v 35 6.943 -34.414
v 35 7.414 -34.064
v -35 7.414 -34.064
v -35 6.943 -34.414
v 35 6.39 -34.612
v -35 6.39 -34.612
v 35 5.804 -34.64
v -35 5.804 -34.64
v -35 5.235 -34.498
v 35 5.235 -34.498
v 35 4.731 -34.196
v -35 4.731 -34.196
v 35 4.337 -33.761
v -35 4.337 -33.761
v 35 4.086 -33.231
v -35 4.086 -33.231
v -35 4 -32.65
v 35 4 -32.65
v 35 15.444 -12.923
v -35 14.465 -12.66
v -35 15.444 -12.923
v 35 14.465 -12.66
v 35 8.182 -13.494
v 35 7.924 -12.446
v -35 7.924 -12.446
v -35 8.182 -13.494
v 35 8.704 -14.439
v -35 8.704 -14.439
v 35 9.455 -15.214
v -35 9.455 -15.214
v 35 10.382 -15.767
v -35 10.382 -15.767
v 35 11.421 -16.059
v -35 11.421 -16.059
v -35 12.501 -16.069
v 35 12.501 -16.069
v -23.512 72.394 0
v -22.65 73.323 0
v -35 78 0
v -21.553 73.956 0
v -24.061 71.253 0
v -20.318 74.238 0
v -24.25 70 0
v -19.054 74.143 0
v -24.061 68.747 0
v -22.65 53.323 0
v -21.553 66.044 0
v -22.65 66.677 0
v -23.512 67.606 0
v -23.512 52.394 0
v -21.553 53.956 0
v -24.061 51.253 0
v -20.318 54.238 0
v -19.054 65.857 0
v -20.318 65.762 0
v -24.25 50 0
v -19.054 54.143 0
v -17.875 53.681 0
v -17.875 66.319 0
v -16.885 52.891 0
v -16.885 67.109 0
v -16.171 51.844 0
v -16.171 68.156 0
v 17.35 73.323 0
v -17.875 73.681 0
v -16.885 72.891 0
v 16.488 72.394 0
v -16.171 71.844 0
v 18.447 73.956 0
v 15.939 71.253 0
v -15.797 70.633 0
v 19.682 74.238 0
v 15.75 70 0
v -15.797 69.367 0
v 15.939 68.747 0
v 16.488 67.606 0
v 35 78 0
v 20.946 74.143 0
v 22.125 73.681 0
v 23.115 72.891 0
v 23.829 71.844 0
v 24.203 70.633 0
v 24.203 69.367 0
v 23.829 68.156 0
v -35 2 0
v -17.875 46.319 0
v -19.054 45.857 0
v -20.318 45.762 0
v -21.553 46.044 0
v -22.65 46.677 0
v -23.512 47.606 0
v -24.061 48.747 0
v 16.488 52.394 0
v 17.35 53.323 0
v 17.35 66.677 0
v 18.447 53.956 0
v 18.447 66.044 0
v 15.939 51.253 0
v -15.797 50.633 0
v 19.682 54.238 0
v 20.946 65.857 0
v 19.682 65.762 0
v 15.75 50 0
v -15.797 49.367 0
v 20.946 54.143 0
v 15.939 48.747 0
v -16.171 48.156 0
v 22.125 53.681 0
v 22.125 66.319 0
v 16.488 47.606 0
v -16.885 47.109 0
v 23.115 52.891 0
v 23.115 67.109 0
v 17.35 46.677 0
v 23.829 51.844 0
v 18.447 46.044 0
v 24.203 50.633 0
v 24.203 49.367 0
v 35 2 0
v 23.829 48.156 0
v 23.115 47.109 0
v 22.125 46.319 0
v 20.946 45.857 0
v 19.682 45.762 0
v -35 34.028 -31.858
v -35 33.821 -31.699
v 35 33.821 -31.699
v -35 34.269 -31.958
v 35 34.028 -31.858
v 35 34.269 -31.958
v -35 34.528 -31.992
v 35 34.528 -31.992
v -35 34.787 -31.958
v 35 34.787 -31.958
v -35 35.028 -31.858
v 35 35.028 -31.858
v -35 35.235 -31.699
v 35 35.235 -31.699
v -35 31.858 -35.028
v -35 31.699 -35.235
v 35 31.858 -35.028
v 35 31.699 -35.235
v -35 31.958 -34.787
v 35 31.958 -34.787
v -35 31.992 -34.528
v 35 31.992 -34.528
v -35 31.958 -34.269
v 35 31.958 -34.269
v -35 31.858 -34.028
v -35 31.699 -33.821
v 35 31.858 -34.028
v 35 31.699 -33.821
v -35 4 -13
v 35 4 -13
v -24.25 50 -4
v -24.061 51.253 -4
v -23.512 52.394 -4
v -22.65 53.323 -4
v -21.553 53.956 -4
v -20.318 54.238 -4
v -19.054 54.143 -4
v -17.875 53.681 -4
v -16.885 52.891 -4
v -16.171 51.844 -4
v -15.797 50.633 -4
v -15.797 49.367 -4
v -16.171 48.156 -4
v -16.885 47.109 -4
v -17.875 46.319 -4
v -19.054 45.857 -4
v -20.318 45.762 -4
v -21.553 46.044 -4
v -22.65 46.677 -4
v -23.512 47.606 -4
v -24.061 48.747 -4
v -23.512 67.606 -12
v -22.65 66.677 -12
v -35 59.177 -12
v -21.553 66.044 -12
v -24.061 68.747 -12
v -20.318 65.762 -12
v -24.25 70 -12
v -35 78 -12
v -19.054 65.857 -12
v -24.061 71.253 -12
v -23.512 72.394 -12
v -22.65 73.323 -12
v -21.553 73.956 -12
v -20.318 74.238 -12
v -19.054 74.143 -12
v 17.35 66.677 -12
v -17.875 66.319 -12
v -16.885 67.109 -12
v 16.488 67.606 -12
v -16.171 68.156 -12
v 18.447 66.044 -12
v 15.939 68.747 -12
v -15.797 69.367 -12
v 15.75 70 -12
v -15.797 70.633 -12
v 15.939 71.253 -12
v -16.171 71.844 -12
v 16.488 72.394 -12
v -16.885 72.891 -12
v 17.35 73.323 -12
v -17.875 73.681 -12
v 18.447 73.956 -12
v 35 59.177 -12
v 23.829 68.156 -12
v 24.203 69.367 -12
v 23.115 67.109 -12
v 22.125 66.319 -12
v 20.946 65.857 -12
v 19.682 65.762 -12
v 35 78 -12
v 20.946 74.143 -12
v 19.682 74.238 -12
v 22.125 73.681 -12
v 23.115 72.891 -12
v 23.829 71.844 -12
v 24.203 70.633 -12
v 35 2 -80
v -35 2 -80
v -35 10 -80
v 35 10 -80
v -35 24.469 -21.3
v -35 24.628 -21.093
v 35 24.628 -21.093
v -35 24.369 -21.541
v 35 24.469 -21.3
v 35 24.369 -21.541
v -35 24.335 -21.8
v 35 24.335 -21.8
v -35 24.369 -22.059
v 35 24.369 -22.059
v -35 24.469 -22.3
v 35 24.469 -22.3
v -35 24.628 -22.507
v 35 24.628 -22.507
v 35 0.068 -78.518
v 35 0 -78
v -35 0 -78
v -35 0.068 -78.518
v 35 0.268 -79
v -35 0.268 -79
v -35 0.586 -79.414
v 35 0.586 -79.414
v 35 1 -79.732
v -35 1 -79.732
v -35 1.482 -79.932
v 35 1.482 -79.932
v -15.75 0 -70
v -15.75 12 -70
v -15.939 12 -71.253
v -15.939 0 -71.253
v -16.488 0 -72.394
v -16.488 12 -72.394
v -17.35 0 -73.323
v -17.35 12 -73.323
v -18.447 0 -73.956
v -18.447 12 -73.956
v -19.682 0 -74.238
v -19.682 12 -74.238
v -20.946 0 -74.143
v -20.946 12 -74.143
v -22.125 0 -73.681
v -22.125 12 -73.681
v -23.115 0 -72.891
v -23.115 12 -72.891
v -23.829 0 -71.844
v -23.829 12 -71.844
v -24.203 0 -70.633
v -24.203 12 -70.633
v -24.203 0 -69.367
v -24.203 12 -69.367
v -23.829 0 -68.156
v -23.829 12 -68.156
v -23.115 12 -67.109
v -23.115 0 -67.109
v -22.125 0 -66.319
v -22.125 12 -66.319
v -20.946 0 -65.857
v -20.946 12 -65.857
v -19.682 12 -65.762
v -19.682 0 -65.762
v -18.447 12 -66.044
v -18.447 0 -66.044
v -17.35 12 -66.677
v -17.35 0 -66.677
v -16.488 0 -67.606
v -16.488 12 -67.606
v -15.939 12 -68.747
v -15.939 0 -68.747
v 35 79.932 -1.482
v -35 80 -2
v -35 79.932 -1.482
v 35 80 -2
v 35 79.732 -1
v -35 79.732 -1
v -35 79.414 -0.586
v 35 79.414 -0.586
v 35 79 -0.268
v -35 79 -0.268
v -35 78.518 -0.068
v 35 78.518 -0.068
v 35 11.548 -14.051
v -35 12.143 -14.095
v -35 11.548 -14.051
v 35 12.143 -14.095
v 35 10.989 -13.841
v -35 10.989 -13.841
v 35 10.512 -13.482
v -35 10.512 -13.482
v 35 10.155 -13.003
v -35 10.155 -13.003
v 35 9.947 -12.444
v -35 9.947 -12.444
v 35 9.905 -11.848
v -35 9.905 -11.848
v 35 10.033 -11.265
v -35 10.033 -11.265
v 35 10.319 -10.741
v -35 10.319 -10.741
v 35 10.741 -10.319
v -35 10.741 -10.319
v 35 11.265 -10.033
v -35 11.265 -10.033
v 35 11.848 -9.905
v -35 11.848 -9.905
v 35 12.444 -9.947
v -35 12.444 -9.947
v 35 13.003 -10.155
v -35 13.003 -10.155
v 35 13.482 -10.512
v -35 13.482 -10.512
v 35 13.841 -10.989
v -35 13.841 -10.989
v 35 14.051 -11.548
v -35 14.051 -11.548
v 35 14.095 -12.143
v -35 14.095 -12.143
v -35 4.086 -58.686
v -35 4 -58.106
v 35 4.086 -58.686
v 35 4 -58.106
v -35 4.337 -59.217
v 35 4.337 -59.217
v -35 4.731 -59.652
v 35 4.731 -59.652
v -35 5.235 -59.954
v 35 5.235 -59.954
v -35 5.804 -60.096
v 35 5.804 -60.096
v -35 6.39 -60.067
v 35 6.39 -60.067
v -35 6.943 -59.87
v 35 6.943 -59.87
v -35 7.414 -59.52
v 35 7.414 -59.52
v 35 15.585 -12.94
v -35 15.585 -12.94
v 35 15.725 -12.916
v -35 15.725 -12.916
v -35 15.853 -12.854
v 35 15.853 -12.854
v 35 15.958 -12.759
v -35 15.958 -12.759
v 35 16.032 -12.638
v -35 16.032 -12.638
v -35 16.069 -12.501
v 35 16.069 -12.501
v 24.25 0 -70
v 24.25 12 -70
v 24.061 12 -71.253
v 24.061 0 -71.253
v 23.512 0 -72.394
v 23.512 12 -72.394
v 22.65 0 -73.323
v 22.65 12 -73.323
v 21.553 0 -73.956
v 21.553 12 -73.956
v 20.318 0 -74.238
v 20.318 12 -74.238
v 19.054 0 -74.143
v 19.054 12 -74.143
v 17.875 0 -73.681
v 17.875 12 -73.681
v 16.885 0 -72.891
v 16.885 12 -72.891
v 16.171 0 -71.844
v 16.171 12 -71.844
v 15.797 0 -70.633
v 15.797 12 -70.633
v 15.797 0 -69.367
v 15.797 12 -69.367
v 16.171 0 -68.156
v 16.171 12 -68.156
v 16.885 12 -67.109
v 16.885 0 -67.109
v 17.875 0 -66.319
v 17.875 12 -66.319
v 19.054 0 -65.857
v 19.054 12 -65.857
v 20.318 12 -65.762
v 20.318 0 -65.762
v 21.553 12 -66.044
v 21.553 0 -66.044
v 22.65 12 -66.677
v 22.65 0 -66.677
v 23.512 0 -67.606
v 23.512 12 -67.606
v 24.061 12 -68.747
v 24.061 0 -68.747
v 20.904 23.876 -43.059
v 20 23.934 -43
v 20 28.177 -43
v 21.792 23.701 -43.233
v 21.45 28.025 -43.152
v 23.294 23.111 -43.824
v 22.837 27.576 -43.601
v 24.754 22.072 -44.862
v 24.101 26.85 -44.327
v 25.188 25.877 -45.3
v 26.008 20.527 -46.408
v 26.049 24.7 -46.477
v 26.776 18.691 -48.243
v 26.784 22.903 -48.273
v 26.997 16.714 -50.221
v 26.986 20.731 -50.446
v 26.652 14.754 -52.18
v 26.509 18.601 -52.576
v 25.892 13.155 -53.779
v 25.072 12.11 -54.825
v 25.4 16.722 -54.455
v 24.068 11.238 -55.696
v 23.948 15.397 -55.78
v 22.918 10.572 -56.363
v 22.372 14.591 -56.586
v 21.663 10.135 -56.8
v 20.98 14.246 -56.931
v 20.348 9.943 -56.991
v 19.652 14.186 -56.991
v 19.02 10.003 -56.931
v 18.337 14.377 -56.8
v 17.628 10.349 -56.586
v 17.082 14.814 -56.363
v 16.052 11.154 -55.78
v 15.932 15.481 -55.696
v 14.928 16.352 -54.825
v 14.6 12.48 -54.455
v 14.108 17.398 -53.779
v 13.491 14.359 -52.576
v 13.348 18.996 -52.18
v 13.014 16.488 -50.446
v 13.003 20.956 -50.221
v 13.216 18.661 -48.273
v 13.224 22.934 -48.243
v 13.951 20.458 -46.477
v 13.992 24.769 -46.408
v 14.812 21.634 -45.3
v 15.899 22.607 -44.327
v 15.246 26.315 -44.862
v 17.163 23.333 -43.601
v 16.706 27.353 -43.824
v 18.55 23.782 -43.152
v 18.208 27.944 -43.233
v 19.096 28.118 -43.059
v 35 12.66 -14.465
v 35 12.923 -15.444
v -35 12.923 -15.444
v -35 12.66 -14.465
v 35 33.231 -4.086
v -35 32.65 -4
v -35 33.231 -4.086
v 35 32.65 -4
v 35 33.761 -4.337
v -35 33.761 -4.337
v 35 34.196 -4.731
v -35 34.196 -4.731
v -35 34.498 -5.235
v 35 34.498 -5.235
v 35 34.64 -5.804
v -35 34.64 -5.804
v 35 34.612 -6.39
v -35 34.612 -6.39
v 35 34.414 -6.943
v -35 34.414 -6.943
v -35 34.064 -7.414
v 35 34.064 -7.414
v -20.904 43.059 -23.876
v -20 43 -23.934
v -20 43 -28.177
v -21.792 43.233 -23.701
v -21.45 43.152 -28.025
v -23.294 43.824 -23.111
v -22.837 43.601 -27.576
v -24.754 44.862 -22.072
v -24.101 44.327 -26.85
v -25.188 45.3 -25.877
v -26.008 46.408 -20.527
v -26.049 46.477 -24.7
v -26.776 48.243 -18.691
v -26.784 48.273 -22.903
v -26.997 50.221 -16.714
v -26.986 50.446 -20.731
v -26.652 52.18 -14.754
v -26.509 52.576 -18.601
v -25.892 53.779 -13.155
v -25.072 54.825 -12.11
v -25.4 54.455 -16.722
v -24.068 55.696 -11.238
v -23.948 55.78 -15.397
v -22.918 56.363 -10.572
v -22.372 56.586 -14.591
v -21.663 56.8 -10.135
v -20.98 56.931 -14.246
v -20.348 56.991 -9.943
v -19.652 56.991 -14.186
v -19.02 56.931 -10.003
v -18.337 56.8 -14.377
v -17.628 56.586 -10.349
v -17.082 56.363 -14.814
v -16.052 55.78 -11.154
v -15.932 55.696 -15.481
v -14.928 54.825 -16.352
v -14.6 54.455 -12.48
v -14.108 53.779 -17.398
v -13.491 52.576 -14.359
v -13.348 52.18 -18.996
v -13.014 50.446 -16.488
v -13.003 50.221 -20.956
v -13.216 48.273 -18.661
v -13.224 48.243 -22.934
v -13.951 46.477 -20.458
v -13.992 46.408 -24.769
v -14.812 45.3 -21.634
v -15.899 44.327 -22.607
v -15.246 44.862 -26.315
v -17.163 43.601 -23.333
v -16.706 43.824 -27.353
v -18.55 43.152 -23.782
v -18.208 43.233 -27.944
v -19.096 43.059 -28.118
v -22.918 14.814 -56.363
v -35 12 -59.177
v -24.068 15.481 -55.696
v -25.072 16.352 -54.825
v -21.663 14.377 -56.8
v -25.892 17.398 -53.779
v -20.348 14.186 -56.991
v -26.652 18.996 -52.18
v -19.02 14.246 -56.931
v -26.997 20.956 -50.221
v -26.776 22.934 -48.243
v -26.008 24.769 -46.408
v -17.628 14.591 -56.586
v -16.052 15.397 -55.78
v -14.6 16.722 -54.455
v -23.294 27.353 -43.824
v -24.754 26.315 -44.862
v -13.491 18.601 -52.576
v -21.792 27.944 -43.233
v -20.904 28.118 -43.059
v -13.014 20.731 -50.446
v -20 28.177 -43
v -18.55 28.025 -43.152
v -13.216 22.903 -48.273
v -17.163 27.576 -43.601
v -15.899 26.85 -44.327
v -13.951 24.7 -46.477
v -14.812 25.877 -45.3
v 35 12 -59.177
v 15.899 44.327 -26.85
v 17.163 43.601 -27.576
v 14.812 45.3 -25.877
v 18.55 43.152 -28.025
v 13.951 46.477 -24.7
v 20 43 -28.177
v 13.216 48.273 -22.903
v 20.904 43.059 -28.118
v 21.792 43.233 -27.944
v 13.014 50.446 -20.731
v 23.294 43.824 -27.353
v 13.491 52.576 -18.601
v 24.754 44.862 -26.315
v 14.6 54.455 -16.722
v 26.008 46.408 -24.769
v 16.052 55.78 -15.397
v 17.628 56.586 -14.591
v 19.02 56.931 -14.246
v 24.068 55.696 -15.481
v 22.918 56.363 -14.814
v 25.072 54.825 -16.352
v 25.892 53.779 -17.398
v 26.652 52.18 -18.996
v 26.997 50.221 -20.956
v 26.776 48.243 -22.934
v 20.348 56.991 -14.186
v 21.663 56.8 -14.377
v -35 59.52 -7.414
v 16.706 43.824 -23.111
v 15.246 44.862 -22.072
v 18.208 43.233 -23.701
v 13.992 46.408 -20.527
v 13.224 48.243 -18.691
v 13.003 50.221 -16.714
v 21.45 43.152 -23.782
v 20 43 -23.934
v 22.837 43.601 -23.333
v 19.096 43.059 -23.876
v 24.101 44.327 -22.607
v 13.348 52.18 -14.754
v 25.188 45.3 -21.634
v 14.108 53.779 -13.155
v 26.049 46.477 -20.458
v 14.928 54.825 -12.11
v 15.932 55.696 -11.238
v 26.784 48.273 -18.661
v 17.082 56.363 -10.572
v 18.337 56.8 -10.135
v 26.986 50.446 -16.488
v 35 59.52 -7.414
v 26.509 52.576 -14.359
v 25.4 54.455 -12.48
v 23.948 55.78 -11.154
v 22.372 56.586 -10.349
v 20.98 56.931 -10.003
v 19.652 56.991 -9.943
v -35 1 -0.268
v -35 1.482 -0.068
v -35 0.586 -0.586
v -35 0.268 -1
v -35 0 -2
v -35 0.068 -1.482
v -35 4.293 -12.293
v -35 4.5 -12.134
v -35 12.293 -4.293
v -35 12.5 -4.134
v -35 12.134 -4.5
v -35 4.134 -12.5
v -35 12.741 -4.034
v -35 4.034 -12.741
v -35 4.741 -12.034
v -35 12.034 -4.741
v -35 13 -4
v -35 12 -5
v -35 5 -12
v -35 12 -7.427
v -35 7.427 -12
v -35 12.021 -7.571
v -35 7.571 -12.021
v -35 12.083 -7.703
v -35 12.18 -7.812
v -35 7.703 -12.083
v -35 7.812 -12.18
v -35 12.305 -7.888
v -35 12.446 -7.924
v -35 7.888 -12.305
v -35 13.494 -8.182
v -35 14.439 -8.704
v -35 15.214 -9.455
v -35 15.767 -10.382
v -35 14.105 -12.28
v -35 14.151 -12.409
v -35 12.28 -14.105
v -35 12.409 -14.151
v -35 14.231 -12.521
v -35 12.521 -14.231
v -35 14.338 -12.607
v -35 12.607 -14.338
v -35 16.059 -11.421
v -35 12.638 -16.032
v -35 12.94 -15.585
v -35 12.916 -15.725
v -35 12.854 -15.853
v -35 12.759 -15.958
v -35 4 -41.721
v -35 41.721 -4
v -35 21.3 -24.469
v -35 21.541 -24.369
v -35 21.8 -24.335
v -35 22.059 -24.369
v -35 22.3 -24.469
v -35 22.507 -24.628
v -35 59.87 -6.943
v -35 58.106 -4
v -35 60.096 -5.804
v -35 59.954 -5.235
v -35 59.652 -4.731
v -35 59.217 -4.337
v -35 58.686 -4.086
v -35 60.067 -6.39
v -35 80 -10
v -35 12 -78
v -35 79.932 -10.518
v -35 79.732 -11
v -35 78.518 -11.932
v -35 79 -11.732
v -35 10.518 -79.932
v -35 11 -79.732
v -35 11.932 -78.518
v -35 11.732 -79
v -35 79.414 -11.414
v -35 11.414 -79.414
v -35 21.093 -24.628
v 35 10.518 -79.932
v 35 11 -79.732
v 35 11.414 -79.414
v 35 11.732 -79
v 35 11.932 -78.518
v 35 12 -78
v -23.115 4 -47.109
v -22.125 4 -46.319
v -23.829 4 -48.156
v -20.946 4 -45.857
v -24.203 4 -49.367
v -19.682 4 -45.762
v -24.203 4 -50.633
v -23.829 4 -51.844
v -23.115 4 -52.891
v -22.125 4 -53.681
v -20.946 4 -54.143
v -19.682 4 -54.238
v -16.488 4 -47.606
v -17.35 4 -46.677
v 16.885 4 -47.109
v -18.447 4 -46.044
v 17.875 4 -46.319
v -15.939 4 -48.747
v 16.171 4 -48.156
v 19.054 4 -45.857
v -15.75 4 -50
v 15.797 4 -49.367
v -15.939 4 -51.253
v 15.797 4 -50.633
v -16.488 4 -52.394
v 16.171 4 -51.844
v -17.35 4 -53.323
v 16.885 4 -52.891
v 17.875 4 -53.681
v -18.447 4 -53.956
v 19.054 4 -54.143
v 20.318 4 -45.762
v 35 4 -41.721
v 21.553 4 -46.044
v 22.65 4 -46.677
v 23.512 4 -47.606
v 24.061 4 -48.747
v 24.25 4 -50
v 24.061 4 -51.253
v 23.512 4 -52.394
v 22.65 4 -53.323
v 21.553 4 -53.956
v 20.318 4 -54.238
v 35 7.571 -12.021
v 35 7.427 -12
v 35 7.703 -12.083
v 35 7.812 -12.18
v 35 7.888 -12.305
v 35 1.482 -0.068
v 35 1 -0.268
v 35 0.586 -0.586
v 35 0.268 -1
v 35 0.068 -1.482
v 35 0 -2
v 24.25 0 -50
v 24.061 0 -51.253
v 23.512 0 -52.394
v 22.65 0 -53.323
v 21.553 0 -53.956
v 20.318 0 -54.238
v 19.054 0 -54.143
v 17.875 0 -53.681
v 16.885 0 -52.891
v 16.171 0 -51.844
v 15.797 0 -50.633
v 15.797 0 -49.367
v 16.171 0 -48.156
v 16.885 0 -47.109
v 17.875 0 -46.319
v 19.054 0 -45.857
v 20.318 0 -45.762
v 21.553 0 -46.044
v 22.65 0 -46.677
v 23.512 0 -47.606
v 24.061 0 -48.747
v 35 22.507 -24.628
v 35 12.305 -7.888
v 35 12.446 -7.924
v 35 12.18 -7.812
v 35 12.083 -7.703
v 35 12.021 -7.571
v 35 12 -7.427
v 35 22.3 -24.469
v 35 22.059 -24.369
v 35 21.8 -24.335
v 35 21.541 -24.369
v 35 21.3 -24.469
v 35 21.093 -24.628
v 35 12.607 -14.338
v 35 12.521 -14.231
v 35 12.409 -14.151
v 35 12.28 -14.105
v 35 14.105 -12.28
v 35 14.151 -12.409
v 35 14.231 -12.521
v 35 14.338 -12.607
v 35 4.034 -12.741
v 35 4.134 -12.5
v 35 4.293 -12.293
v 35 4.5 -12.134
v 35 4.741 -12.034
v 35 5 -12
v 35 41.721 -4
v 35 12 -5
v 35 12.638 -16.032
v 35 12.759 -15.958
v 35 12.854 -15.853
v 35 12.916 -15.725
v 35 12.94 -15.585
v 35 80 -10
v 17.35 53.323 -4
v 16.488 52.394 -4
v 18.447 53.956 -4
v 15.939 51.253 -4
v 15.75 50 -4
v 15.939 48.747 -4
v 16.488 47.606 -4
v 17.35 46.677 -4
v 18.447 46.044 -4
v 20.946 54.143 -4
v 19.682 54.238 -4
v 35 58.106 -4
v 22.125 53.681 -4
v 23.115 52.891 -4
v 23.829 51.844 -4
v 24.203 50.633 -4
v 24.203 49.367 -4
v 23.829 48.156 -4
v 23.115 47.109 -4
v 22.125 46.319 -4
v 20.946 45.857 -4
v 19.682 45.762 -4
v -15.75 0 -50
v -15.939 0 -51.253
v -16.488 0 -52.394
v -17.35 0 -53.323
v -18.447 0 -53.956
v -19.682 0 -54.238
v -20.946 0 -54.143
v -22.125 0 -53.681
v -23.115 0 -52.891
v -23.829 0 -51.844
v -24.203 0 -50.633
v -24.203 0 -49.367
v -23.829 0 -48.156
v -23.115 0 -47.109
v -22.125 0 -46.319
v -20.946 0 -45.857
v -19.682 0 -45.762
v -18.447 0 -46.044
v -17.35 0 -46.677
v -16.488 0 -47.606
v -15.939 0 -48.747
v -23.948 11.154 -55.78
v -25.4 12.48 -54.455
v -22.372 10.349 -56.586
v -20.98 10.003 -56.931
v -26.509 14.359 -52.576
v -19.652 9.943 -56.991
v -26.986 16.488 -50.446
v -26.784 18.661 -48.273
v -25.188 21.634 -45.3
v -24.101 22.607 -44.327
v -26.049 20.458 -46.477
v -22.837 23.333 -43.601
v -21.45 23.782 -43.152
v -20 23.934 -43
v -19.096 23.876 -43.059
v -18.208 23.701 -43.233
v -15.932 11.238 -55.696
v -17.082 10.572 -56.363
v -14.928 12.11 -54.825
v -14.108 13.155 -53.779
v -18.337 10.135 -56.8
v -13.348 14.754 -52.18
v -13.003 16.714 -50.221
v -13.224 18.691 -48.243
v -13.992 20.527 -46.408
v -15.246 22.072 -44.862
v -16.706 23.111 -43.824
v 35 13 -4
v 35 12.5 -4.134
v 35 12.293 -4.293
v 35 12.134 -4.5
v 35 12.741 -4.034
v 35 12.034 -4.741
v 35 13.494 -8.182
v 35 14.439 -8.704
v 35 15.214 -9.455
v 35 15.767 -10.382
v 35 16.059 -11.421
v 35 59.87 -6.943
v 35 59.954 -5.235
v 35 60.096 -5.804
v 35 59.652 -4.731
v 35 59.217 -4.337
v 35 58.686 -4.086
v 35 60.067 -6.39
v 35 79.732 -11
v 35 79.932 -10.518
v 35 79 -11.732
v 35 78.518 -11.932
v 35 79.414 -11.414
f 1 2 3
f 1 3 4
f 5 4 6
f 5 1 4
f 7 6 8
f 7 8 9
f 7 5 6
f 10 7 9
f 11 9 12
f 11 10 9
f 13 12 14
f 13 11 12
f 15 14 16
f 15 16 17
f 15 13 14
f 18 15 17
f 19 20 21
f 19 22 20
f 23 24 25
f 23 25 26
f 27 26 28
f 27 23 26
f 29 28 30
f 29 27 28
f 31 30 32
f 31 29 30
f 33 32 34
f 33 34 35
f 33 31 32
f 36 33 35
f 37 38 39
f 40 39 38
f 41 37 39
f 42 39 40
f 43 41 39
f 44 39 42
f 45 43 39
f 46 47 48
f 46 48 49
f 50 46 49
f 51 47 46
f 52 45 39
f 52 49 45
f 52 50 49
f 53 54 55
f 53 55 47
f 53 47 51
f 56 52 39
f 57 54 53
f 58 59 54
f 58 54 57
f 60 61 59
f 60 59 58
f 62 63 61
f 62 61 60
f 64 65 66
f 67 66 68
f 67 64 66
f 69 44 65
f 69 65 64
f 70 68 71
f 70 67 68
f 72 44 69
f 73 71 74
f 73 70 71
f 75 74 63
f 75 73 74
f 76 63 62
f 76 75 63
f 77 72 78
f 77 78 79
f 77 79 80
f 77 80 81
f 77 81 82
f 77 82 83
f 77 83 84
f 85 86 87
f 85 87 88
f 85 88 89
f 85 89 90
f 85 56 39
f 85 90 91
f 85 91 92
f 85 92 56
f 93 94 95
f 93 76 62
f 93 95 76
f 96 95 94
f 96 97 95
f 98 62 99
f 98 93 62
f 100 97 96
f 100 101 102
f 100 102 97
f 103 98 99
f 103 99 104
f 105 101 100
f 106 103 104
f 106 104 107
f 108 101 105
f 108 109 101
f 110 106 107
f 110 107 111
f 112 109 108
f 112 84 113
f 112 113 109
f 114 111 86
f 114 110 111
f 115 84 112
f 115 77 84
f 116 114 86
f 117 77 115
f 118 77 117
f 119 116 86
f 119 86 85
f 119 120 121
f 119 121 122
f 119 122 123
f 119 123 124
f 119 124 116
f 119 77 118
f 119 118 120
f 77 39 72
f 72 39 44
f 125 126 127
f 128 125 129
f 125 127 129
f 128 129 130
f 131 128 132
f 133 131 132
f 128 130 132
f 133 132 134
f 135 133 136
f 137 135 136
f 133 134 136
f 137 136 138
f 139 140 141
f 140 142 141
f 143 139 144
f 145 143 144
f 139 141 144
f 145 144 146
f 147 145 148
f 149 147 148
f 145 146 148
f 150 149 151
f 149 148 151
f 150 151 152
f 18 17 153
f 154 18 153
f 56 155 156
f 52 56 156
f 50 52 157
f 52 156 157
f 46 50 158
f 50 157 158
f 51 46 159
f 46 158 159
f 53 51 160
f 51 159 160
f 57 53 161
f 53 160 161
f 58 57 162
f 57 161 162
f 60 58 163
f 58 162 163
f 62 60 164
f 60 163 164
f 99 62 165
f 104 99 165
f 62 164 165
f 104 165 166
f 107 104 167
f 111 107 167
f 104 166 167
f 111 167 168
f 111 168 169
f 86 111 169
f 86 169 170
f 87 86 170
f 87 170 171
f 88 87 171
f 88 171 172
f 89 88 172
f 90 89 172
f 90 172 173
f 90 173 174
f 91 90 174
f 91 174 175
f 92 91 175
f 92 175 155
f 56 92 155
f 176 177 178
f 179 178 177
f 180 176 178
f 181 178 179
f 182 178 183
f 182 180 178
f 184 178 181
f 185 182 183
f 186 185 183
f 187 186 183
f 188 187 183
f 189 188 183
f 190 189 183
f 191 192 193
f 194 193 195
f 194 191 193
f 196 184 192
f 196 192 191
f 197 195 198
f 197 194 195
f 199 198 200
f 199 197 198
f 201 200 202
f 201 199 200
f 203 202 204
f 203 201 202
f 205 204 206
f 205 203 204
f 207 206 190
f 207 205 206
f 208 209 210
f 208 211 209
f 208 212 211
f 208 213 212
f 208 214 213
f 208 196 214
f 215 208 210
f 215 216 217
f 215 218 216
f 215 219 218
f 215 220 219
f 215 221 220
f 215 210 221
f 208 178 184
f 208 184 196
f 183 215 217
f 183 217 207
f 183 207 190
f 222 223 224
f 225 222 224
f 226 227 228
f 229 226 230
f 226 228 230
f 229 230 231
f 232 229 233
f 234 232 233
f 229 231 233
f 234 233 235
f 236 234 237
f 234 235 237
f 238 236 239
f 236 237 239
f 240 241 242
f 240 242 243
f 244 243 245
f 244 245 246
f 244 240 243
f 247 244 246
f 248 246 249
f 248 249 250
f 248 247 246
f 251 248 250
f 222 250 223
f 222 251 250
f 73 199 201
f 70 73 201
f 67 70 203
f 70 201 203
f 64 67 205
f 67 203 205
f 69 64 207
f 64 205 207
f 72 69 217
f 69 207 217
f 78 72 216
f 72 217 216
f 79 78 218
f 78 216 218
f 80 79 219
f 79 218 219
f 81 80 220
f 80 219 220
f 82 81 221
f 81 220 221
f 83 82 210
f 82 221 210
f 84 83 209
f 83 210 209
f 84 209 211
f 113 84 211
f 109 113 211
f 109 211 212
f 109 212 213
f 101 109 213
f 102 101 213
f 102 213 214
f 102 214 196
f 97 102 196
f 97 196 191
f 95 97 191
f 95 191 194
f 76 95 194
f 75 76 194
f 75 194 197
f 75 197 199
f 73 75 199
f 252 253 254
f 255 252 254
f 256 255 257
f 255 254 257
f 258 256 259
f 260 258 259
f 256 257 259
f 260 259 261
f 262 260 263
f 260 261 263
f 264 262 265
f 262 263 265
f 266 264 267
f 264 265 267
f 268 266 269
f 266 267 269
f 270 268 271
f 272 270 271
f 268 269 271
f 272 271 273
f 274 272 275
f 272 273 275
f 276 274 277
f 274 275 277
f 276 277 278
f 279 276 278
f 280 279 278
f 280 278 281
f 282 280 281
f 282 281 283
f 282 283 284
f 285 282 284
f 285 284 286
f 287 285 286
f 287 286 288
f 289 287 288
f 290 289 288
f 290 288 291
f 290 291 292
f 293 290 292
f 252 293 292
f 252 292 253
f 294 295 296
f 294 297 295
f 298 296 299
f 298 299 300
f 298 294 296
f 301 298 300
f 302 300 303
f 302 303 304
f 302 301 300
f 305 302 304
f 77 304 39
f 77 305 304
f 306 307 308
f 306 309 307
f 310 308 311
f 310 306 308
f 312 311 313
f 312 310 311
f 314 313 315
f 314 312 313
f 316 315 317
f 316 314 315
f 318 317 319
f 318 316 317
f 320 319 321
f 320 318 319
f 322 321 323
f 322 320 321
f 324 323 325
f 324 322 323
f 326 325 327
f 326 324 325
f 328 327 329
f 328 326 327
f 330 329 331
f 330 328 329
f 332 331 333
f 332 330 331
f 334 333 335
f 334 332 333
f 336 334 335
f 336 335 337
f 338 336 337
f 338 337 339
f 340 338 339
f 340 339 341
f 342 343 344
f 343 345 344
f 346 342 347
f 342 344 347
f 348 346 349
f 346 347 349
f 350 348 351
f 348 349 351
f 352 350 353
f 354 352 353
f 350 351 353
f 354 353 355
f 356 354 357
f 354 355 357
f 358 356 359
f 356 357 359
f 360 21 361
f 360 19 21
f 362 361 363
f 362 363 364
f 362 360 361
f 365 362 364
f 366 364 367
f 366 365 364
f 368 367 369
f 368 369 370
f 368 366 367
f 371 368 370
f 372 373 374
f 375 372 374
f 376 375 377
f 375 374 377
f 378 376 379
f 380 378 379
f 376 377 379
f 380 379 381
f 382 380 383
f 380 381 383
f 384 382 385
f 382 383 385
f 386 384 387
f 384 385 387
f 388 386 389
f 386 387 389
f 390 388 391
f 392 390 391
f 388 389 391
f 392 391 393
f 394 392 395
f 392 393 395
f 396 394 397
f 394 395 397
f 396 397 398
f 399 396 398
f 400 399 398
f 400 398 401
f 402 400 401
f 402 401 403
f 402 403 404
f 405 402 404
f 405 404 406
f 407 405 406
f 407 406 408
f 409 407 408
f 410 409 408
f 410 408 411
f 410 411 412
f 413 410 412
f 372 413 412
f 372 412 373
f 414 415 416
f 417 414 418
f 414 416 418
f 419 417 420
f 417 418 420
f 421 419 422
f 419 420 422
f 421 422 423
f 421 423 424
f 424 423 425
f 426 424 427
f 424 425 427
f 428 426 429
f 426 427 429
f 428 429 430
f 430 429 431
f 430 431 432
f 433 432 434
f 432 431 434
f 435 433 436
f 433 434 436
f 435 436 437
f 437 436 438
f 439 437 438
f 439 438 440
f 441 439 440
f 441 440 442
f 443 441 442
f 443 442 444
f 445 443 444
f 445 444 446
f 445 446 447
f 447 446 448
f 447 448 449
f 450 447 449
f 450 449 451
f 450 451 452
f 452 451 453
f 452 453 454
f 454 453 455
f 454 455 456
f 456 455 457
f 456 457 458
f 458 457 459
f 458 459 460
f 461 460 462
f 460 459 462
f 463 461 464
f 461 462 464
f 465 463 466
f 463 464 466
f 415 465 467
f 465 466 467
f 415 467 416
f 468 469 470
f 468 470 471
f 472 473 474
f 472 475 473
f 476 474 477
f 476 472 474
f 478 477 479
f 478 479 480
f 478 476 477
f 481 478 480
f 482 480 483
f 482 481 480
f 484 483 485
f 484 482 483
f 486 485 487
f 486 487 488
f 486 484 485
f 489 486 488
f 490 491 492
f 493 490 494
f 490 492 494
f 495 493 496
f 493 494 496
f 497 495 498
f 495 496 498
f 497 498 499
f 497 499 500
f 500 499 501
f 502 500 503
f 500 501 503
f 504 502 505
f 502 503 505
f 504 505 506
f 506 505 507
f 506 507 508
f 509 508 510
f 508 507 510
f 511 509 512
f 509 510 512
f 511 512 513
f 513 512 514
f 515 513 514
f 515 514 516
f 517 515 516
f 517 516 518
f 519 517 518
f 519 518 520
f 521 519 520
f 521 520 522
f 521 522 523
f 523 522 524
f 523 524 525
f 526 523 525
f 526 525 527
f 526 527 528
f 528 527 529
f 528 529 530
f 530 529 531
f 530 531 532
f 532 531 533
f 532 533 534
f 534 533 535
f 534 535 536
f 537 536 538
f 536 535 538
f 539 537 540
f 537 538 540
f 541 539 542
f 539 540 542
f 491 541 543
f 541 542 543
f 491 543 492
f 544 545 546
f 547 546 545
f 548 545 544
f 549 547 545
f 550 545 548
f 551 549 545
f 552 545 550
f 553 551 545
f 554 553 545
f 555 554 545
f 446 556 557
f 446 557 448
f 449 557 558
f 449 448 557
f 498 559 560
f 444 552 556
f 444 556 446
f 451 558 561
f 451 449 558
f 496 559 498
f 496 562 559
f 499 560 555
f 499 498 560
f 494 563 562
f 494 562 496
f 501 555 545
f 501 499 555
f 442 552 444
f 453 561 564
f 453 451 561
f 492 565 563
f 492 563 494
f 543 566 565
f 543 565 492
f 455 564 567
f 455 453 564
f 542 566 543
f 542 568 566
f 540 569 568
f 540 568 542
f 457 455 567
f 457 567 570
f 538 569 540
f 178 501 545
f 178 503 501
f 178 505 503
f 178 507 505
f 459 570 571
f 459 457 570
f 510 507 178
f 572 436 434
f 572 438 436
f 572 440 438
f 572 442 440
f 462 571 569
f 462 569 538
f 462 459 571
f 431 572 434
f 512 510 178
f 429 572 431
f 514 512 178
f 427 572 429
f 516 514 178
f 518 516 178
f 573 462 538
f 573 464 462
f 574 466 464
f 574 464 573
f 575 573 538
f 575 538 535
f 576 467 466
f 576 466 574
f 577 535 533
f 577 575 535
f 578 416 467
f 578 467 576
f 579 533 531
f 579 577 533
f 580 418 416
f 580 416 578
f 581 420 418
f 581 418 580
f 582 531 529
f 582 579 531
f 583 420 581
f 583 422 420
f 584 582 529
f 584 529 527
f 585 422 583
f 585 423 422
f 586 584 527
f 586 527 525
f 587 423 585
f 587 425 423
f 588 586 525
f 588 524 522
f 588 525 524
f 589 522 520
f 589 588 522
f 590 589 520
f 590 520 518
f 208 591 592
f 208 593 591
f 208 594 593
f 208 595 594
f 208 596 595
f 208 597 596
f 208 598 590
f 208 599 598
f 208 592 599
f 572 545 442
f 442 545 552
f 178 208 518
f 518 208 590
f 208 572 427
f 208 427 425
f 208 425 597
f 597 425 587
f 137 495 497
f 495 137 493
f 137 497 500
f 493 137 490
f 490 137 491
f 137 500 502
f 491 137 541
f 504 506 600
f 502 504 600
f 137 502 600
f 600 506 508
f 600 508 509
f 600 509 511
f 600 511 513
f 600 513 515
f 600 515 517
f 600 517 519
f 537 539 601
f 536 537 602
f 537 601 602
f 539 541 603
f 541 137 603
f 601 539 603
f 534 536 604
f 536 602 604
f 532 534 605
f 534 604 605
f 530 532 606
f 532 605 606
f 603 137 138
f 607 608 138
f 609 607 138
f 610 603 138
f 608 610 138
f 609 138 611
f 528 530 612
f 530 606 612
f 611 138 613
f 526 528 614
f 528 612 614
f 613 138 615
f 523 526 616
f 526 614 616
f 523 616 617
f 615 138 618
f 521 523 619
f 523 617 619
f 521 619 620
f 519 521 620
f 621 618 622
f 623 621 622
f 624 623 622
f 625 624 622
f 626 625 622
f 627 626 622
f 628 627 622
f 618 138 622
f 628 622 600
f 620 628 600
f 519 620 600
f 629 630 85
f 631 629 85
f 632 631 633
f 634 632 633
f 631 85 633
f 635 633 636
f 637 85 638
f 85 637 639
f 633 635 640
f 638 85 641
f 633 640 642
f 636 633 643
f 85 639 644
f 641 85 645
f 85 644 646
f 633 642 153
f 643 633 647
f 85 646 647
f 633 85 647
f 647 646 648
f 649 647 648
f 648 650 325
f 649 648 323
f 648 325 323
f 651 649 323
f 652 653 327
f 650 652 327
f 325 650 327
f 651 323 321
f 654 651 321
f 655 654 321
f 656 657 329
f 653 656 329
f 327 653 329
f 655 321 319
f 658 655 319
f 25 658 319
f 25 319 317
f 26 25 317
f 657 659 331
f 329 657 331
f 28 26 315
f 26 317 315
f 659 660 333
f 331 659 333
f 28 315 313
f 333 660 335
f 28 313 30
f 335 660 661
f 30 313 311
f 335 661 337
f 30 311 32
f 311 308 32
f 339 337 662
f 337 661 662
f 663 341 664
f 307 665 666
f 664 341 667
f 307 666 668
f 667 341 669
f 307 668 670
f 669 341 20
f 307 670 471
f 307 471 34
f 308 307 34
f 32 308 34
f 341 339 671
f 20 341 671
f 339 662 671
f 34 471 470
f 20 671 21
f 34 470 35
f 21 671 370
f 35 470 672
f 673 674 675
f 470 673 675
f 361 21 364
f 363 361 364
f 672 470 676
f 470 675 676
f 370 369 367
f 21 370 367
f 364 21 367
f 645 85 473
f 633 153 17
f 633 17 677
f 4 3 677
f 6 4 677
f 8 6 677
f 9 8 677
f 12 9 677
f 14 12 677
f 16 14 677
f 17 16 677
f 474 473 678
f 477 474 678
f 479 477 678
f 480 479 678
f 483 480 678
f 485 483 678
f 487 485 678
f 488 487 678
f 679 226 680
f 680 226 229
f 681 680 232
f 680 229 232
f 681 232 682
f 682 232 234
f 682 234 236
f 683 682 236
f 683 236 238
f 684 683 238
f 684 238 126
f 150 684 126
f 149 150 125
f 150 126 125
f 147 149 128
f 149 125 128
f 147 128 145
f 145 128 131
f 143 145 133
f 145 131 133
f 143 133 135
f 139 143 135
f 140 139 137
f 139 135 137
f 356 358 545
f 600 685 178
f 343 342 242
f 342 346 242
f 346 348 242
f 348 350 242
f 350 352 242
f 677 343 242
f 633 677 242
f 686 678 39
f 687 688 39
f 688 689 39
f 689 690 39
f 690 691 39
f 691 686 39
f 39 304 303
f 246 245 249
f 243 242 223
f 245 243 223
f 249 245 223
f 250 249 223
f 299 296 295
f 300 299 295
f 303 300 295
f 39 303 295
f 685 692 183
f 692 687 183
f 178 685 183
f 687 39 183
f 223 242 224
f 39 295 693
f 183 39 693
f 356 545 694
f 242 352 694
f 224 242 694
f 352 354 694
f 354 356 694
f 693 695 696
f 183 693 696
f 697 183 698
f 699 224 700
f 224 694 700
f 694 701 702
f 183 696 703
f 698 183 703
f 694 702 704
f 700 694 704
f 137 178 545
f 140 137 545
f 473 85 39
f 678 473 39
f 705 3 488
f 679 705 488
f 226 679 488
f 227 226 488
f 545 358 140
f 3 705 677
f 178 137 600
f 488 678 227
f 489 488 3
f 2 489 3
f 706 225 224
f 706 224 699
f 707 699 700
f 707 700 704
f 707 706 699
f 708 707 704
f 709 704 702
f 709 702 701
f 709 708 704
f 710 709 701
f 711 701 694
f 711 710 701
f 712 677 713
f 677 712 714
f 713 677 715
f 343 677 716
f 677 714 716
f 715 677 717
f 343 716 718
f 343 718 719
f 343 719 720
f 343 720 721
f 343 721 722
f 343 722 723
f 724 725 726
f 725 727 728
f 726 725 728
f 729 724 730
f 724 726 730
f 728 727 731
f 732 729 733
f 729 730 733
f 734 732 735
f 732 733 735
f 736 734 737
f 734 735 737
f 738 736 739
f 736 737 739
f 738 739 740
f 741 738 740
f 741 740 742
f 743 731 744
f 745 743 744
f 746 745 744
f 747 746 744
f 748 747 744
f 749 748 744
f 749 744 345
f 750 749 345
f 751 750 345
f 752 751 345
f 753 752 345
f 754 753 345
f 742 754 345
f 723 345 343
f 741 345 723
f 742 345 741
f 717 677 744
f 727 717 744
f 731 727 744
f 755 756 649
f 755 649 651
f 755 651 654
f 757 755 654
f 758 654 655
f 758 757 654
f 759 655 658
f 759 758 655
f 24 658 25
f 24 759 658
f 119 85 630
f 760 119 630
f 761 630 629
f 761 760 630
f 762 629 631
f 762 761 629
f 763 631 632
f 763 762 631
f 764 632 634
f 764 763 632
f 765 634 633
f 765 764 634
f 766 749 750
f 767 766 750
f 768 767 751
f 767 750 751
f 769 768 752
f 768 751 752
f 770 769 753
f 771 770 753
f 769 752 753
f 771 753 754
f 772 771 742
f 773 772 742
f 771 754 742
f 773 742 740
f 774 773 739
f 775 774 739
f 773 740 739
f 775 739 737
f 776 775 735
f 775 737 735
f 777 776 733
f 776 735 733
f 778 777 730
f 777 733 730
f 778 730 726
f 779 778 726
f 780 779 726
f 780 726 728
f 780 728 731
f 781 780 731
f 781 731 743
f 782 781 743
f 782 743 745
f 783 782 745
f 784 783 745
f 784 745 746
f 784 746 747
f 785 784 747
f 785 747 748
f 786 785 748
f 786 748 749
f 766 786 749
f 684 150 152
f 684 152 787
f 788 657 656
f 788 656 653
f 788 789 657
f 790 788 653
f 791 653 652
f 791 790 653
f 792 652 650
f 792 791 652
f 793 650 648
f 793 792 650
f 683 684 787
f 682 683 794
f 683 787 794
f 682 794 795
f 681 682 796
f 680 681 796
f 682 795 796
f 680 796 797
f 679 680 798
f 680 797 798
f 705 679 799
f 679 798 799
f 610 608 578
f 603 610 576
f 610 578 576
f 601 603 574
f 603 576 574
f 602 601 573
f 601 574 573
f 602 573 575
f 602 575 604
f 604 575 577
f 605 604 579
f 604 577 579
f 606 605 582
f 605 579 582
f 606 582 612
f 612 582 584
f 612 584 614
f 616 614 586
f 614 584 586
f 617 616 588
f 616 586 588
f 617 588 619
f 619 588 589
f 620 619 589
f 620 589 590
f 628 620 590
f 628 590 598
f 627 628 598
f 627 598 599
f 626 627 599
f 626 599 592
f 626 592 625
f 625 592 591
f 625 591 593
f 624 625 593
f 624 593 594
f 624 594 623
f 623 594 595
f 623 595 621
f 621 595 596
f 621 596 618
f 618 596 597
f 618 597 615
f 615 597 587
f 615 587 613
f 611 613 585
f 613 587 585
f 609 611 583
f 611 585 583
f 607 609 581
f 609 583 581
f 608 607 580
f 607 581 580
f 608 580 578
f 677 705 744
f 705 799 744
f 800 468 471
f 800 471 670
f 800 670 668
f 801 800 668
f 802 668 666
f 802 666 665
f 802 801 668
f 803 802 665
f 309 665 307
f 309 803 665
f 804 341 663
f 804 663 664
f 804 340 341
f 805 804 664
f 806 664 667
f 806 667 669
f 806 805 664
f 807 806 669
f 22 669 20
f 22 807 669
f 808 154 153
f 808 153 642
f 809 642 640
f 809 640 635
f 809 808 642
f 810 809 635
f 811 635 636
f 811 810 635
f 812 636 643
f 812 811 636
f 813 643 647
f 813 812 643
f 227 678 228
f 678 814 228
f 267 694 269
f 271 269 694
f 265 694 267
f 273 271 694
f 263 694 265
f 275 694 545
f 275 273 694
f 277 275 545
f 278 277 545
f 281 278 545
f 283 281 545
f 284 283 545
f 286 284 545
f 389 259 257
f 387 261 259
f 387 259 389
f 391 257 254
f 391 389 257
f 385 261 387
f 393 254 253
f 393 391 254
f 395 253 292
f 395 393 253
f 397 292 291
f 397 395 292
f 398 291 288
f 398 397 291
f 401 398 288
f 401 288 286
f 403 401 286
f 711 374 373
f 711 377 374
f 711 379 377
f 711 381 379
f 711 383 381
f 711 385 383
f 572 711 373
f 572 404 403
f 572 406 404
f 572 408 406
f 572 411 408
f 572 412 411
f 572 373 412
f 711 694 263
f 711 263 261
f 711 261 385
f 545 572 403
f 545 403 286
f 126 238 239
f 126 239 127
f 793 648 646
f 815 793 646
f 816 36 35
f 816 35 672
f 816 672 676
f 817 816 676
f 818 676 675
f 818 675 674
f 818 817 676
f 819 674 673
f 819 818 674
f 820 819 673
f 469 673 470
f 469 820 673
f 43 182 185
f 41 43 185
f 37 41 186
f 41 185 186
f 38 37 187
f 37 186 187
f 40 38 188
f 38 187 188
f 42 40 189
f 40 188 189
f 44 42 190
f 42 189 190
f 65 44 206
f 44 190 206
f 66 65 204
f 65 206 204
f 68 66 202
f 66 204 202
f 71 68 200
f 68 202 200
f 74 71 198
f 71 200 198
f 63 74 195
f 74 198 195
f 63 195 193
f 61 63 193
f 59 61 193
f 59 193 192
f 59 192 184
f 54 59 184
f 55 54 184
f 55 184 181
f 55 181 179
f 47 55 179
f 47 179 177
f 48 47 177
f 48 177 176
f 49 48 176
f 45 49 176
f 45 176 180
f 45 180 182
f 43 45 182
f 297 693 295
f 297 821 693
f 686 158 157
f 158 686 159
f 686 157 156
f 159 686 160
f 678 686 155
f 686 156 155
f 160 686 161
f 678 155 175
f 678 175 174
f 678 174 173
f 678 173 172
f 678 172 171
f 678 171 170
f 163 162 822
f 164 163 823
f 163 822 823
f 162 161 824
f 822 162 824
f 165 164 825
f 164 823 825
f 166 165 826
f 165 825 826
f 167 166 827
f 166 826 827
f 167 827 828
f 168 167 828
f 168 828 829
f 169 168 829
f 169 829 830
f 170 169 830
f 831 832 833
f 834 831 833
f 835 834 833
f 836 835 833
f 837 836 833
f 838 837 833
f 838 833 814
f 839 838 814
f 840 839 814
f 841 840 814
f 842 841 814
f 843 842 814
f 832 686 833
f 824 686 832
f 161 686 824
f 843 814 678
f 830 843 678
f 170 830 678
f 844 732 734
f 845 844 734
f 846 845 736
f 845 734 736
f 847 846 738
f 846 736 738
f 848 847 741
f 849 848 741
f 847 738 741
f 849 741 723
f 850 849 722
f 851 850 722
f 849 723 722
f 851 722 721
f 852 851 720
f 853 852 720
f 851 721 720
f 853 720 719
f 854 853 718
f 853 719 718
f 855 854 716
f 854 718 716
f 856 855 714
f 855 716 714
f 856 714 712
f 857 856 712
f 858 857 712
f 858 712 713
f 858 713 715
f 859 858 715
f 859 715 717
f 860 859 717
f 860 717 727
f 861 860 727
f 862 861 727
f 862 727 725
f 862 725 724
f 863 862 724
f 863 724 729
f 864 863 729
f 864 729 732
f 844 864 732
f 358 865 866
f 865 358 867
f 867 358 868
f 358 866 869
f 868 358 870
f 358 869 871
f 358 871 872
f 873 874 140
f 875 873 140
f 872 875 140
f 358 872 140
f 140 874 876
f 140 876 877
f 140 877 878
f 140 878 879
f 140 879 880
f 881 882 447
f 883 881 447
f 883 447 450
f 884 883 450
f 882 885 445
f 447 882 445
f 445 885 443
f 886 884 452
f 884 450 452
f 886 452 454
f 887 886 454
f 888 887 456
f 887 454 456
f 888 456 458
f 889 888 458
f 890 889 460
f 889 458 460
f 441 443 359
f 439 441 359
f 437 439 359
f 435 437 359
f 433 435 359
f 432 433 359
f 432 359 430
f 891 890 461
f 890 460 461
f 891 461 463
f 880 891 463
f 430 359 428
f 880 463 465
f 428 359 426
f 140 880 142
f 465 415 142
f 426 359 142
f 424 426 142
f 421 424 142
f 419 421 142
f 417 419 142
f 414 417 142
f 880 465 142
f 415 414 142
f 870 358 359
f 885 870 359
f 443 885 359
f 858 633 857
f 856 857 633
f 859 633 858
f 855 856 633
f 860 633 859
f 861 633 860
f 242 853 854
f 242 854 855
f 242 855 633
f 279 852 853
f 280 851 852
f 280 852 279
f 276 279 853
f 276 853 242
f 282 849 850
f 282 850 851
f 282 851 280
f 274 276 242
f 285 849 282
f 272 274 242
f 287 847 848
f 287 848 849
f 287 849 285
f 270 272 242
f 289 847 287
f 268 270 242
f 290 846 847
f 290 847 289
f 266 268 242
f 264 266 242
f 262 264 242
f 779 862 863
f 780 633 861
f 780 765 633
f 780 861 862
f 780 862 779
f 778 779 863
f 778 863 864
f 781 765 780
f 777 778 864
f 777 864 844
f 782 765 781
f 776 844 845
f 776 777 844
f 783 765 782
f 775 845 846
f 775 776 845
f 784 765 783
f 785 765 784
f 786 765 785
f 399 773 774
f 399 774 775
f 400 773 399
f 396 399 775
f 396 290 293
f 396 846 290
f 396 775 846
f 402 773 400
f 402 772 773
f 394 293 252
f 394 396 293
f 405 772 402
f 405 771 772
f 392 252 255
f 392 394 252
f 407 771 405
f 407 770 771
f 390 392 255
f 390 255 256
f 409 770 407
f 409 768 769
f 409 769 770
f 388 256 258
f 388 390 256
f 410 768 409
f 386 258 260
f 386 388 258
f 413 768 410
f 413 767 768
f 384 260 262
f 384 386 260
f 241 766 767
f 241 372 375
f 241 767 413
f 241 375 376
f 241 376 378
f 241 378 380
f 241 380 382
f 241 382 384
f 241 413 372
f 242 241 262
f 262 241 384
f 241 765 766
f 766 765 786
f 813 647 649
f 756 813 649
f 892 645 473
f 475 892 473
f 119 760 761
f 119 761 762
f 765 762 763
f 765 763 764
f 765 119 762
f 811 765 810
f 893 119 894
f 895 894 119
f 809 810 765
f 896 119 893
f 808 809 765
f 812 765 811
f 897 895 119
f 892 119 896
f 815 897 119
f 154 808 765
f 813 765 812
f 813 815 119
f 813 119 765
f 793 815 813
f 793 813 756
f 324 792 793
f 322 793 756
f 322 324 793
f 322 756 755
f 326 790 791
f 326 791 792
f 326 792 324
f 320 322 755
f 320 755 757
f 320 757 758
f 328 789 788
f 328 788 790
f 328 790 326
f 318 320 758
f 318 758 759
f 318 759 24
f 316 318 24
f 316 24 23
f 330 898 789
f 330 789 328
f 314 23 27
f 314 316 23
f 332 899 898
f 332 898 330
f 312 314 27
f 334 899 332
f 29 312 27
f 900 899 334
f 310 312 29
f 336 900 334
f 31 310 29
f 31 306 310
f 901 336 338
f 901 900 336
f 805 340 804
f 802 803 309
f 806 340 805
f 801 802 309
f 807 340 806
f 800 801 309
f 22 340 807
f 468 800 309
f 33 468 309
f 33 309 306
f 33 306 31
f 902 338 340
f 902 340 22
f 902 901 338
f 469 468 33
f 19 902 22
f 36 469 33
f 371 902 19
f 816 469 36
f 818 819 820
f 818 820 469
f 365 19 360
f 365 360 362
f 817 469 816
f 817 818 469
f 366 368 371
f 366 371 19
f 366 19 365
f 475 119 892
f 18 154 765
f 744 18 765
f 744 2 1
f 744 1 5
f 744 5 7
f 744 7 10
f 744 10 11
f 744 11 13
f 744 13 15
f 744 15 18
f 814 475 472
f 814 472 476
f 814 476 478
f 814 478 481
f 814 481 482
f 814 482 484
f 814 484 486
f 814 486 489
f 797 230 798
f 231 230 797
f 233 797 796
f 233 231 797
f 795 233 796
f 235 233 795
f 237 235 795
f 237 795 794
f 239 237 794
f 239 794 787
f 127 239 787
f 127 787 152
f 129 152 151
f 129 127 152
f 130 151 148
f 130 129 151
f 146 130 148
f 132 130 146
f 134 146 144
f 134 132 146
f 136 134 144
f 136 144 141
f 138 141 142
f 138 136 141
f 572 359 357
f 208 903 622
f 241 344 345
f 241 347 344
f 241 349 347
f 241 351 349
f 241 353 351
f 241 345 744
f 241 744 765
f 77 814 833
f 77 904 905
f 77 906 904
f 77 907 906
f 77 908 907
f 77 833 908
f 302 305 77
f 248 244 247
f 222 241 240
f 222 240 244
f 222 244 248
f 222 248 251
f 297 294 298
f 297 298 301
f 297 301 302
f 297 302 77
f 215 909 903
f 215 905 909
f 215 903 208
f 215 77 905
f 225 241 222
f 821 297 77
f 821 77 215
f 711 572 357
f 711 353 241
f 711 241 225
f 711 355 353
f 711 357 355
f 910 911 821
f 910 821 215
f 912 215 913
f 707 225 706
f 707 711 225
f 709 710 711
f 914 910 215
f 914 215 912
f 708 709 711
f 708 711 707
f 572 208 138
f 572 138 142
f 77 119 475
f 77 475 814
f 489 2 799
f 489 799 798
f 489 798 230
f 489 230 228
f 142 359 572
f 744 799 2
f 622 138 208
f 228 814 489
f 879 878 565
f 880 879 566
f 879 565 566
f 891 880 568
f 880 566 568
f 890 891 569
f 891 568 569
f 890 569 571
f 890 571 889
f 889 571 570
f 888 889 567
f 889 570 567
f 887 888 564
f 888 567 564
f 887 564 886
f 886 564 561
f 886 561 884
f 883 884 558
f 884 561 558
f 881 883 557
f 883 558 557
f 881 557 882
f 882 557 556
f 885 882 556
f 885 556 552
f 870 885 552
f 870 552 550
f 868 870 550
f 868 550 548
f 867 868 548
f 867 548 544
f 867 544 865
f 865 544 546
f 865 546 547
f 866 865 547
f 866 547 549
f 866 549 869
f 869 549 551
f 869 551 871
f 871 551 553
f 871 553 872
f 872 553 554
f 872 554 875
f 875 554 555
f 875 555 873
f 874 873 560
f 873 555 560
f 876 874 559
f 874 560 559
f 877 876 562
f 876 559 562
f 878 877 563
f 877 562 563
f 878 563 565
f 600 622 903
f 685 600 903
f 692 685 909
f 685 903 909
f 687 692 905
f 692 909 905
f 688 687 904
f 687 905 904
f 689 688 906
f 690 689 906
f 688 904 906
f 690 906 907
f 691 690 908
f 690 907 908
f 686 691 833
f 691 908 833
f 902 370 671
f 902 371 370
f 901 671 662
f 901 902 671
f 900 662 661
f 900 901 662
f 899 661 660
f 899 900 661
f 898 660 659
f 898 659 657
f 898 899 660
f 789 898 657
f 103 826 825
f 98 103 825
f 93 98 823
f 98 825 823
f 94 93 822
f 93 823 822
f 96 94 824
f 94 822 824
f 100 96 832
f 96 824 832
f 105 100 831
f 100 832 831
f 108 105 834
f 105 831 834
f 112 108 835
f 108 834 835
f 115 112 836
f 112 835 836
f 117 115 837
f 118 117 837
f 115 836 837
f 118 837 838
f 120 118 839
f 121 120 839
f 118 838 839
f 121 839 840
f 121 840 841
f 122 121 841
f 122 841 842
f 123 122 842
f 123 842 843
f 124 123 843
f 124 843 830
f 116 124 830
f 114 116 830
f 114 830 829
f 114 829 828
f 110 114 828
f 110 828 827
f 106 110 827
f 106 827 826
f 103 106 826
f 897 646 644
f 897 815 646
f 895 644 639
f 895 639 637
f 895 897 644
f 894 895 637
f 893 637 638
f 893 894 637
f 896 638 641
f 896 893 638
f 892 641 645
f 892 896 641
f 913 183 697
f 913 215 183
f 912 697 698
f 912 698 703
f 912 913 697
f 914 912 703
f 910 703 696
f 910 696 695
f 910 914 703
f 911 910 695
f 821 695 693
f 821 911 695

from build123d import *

# Parameters (mm, degrees)
BOSS_EXTRUDE1_DEPTH = 35
DIAMETERHOLE1_D     = 8.5
DIAMETERHOLE1_DEPTH = 12
DIAMETERHOLE2_D     = 8.5
DIAMETERHOLE2_DEPTH = 12.001
DIAMETERHOLE3_REACH = 120.427
SKETCH6_R           = 7
DIAMETERHOLE4_REACH = 120.427
SKETCH7_R           = 7
LPATTERN1_COUNT     = 2
LPATTERN1_PITCH     = 40


with BuildPart() as part:
    # Sketch1 → Boss-Extrude1 (new, symmetric)
    with BuildSketch(Plane(origin=(0, 0, 0), x_dir=(0, 0, -1), z_dir=(1, 0, 0))):
        with BuildLine():
            Line((2, 0), (78, 0))
            ThreePointArc((78, 0), (79.414213562, 0.585786438), (80, 2))
            Line((80, 2), (80, 10))
            ThreePointArc((80, 10), (79.414213562, 11.414213562), (78, 12))
            Line((78, 12), (59.176911935, 12))
            Line((59.176911935, 12), (12, 59.176911935))
            Line((12, 59.176911935), (12, 78))
            ThreePointArc((12, 78), (11.414213562, 79.414213562), (10, 80))
            Line((10, 80), (2, 80))
            ThreePointArc((2, 80), (0.585786438, 79.414213562), (0, 78))
            Line((0, 78), (0, 2))
            ThreePointArc((0, 2), (0.585786438, 0.585786438), (2, 0))
        make_face()
        with BuildLine():
            Line((7.414213562, 34.064213562), (34.064213562, 7.414213562))
            ThreePointArc((34.064213562, 7.414213562), (34.497759065, 5.234633135), (32.65, 4))
            Line((32.65, 4), (13, 4))
            ThreePointArc((13, 4), (12.292893219, 4.292893219), (12, 5))
            Line((12, 5), (12, 7.427254654))
            ThreePointArc((12, 7.427254654), (12.127727309, 7.761040579), (12.445652174, 7.924292192))
            ThreePointArc((12.445652174, 7.924292192), (15.214400117, 9.454880771), (16.069295651, 12.500832214))
            ThreePointArc((16.069295651, 12.500832214), (15.852577049, 12.854314019), (15.443630561, 12.922718028))
            Line((15.443630561, 12.922718028), (14.464530927, 12.660369072))
            ThreePointArc((14.464530927, 12.660369072), (14.187104489, 12.468068335), (14.095105748, 12.143289589))
            ThreePointArc((14.095105748, 12.143289589), (10.51507576, 10.51507576), (12.143289589, 14.095105748))
            ThreePointArc((12.143289589, 14.095105748), (12.468068335, 14.187104489), (12.660369072, 14.464530927))
            Line((12.660369072, 14.464530927), (12.922718028, 15.443630561))
            ThreePointArc((12.922718028, 15.443630561), (12.854314019, 15.852577049), (12.500832214, 16.069295651))
            ThreePointArc((12.500832214, 16.069295651), (9.454880771, 15.214400117), (7.924292192, 12.445652174))
            ThreePointArc((7.924292192, 12.445652174), (7.761040579, 12.127727309), (7.427254654, 12))
            Line((7.427254654, 12), (5, 12))
            ThreePointArc((5, 12), (4.292893219, 12.292893219), (4, 13))
            Line((4, 13), (4, 32.65))
            ThreePointArc((4, 32.65), (5.234633135, 34.497759065), (7.414213562, 34.064213562))
        make_face(mode=Mode.SUBTRACT)
        with BuildLine():
            Line((4, 58.105844123), (4, 41.721067812))
            Line((4, 41.721067812), (21.092766953, 24.628300859))
            ThreePointArc((21.092766953, 24.628300859), (21.799873734, 24.33540764), (22.506980515, 24.628300859))
            Line((22.506980515, 24.628300859), (31.699368671, 33.820689014))
            ThreePointArc((31.699368671, 33.820689014), (31.99226189, 34.527795796), (31.699368671, 35.234902577))
            Line((31.699368671, 35.234902577), (7.414213562, 59.520057685))
            ThreePointArc((7.414213562, 59.520057685), (5.234633135, 59.953603188), (4, 58.105844123))
        make_face(mode=Mode.SUBTRACT)
        with BuildLine():
            Line((33.820689014, 31.699368671), (24.628300859, 22.506980515))
            ThreePointArc((24.628300859, 22.506980515), (24.33540764, 21.799873734), (24.628300859, 21.092766953))
            Line((24.628300859, 21.092766953), (41.721067812, 4))
            Line((41.721067812, 4), (58.105844123, 4))
            ThreePointArc((58.105844123, 4), (59.953603188, 5.234633135), (59.520057685, 7.414213562))
            Line((59.520057685, 7.414213562), (35.234902577, 31.699368671))
            ThreePointArc((35.234902577, 31.699368671), (34.527795796, 31.99226189), (33.820689014, 31.699368671))
        make_face(mode=Mode.SUBTRACT)
    extrude(amount=BOSS_EXTRUDE1_DEPTH, both=True)

    # DiameterHole1
    with Locations(Plane.XY):
        with Locations((-20, 70), (-20, 50)):
            diameterhole1 = Hole(DIAMETERHOLE1_D / 2, depth=DIAMETERHOLE1_DEPTH)

    # DiameterHole2
    with Locations(Plane(origin=(0, 0, 0), x_dir=(-1, 0, 0), z_dir=(0, -1, 0))):
        with Locations((20, 70), (20, 50)):
            diameterhole2 = Hole(DIAMETERHOLE2_D / 2, depth=DIAMETERHOLE2_DEPTH)

    # DiameterHole3: up to this plane
    diameterhole3_end = Plane(origin=(35, 7.414213562, -59.520057685), z_dir=(0, -0.7071067811865515, 0.7071067811865437))
    # Sketch6 → DiameterHole3 (cut, up to the surface)
    with BuildSketch(Plane(origin=(0, 80, 0), x_dir=(1, 0, 0), z_dir=(0, 1, 0)), mode=Mode.PRIVATE) as diameterhole3_sk1:
        with Locations(Location((-20, 50, 0), (0, 0, 270))):
            Circle(SKETCH6_R)
    diameterhole3_tool1 = split(extrude(diameterhole3_sk1.sketch, amount=-DIAMETERHOLE3_REACH, mode=Mode.PRIVATE), bisect_by=diameterhole3_end, keep=Keep.BOTH, mode=Mode.PRIVATE)
    diameterhole3 = diameterhole3_tool1.solids().sort_by_distance((-20, 80, -50))[0]
    add(diameterhole3, mode=Mode.SUBTRACT)

    # DiameterHole4: up to this plane
    diameterhole4_end = Plane(origin=(35, 35.234902577, -31.699368671), z_dir=(0, -0.7071067811865511, 0.707106781186544))
    # Sketch7 → DiameterHole4 (cut, up to the surface)
    with BuildSketch(Plane(origin=(0, 0, -80), x_dir=(-1, 0, 0), z_dir=(0, 0, -1)), mode=Mode.PRIVATE) as diameterhole4_sk1:
        with Locations(Location((20, 50, 0), (0, 0, 270))):
            Circle(SKETCH7_R)
    diameterhole4_tool1 = split(extrude(diameterhole4_sk1.sketch, amount=-DIAMETERHOLE4_REACH, mode=Mode.PRIVATE), bisect_by=diameterhole4_end, keep=Keep.BOTH, mode=Mode.PRIVATE)
    diameterhole4 = diameterhole4_tool1.solids().sort_by_distance((-20, 50, -80))[0]
    add(diameterhole4, mode=Mode.SUBTRACT)

    # LPattern1: DiameterHole1, DiameterHole2, DiameterHole3, DiameterHole4 ×2
    with Locations(*[(i * LPATTERN1_PITCH, 0, 0) for i in range(1, LPATTERN1_COUNT)]):
        add(diameterhole1, mode=Mode.SUBTRACT)
        add(diameterhole2, mode=Mode.SUBTRACT)
        add(diameterhole3, mode=Mode.SUBTRACT)
        add(diameterhole4, mode=Mode.SUBTRACT)


solid = part.part
